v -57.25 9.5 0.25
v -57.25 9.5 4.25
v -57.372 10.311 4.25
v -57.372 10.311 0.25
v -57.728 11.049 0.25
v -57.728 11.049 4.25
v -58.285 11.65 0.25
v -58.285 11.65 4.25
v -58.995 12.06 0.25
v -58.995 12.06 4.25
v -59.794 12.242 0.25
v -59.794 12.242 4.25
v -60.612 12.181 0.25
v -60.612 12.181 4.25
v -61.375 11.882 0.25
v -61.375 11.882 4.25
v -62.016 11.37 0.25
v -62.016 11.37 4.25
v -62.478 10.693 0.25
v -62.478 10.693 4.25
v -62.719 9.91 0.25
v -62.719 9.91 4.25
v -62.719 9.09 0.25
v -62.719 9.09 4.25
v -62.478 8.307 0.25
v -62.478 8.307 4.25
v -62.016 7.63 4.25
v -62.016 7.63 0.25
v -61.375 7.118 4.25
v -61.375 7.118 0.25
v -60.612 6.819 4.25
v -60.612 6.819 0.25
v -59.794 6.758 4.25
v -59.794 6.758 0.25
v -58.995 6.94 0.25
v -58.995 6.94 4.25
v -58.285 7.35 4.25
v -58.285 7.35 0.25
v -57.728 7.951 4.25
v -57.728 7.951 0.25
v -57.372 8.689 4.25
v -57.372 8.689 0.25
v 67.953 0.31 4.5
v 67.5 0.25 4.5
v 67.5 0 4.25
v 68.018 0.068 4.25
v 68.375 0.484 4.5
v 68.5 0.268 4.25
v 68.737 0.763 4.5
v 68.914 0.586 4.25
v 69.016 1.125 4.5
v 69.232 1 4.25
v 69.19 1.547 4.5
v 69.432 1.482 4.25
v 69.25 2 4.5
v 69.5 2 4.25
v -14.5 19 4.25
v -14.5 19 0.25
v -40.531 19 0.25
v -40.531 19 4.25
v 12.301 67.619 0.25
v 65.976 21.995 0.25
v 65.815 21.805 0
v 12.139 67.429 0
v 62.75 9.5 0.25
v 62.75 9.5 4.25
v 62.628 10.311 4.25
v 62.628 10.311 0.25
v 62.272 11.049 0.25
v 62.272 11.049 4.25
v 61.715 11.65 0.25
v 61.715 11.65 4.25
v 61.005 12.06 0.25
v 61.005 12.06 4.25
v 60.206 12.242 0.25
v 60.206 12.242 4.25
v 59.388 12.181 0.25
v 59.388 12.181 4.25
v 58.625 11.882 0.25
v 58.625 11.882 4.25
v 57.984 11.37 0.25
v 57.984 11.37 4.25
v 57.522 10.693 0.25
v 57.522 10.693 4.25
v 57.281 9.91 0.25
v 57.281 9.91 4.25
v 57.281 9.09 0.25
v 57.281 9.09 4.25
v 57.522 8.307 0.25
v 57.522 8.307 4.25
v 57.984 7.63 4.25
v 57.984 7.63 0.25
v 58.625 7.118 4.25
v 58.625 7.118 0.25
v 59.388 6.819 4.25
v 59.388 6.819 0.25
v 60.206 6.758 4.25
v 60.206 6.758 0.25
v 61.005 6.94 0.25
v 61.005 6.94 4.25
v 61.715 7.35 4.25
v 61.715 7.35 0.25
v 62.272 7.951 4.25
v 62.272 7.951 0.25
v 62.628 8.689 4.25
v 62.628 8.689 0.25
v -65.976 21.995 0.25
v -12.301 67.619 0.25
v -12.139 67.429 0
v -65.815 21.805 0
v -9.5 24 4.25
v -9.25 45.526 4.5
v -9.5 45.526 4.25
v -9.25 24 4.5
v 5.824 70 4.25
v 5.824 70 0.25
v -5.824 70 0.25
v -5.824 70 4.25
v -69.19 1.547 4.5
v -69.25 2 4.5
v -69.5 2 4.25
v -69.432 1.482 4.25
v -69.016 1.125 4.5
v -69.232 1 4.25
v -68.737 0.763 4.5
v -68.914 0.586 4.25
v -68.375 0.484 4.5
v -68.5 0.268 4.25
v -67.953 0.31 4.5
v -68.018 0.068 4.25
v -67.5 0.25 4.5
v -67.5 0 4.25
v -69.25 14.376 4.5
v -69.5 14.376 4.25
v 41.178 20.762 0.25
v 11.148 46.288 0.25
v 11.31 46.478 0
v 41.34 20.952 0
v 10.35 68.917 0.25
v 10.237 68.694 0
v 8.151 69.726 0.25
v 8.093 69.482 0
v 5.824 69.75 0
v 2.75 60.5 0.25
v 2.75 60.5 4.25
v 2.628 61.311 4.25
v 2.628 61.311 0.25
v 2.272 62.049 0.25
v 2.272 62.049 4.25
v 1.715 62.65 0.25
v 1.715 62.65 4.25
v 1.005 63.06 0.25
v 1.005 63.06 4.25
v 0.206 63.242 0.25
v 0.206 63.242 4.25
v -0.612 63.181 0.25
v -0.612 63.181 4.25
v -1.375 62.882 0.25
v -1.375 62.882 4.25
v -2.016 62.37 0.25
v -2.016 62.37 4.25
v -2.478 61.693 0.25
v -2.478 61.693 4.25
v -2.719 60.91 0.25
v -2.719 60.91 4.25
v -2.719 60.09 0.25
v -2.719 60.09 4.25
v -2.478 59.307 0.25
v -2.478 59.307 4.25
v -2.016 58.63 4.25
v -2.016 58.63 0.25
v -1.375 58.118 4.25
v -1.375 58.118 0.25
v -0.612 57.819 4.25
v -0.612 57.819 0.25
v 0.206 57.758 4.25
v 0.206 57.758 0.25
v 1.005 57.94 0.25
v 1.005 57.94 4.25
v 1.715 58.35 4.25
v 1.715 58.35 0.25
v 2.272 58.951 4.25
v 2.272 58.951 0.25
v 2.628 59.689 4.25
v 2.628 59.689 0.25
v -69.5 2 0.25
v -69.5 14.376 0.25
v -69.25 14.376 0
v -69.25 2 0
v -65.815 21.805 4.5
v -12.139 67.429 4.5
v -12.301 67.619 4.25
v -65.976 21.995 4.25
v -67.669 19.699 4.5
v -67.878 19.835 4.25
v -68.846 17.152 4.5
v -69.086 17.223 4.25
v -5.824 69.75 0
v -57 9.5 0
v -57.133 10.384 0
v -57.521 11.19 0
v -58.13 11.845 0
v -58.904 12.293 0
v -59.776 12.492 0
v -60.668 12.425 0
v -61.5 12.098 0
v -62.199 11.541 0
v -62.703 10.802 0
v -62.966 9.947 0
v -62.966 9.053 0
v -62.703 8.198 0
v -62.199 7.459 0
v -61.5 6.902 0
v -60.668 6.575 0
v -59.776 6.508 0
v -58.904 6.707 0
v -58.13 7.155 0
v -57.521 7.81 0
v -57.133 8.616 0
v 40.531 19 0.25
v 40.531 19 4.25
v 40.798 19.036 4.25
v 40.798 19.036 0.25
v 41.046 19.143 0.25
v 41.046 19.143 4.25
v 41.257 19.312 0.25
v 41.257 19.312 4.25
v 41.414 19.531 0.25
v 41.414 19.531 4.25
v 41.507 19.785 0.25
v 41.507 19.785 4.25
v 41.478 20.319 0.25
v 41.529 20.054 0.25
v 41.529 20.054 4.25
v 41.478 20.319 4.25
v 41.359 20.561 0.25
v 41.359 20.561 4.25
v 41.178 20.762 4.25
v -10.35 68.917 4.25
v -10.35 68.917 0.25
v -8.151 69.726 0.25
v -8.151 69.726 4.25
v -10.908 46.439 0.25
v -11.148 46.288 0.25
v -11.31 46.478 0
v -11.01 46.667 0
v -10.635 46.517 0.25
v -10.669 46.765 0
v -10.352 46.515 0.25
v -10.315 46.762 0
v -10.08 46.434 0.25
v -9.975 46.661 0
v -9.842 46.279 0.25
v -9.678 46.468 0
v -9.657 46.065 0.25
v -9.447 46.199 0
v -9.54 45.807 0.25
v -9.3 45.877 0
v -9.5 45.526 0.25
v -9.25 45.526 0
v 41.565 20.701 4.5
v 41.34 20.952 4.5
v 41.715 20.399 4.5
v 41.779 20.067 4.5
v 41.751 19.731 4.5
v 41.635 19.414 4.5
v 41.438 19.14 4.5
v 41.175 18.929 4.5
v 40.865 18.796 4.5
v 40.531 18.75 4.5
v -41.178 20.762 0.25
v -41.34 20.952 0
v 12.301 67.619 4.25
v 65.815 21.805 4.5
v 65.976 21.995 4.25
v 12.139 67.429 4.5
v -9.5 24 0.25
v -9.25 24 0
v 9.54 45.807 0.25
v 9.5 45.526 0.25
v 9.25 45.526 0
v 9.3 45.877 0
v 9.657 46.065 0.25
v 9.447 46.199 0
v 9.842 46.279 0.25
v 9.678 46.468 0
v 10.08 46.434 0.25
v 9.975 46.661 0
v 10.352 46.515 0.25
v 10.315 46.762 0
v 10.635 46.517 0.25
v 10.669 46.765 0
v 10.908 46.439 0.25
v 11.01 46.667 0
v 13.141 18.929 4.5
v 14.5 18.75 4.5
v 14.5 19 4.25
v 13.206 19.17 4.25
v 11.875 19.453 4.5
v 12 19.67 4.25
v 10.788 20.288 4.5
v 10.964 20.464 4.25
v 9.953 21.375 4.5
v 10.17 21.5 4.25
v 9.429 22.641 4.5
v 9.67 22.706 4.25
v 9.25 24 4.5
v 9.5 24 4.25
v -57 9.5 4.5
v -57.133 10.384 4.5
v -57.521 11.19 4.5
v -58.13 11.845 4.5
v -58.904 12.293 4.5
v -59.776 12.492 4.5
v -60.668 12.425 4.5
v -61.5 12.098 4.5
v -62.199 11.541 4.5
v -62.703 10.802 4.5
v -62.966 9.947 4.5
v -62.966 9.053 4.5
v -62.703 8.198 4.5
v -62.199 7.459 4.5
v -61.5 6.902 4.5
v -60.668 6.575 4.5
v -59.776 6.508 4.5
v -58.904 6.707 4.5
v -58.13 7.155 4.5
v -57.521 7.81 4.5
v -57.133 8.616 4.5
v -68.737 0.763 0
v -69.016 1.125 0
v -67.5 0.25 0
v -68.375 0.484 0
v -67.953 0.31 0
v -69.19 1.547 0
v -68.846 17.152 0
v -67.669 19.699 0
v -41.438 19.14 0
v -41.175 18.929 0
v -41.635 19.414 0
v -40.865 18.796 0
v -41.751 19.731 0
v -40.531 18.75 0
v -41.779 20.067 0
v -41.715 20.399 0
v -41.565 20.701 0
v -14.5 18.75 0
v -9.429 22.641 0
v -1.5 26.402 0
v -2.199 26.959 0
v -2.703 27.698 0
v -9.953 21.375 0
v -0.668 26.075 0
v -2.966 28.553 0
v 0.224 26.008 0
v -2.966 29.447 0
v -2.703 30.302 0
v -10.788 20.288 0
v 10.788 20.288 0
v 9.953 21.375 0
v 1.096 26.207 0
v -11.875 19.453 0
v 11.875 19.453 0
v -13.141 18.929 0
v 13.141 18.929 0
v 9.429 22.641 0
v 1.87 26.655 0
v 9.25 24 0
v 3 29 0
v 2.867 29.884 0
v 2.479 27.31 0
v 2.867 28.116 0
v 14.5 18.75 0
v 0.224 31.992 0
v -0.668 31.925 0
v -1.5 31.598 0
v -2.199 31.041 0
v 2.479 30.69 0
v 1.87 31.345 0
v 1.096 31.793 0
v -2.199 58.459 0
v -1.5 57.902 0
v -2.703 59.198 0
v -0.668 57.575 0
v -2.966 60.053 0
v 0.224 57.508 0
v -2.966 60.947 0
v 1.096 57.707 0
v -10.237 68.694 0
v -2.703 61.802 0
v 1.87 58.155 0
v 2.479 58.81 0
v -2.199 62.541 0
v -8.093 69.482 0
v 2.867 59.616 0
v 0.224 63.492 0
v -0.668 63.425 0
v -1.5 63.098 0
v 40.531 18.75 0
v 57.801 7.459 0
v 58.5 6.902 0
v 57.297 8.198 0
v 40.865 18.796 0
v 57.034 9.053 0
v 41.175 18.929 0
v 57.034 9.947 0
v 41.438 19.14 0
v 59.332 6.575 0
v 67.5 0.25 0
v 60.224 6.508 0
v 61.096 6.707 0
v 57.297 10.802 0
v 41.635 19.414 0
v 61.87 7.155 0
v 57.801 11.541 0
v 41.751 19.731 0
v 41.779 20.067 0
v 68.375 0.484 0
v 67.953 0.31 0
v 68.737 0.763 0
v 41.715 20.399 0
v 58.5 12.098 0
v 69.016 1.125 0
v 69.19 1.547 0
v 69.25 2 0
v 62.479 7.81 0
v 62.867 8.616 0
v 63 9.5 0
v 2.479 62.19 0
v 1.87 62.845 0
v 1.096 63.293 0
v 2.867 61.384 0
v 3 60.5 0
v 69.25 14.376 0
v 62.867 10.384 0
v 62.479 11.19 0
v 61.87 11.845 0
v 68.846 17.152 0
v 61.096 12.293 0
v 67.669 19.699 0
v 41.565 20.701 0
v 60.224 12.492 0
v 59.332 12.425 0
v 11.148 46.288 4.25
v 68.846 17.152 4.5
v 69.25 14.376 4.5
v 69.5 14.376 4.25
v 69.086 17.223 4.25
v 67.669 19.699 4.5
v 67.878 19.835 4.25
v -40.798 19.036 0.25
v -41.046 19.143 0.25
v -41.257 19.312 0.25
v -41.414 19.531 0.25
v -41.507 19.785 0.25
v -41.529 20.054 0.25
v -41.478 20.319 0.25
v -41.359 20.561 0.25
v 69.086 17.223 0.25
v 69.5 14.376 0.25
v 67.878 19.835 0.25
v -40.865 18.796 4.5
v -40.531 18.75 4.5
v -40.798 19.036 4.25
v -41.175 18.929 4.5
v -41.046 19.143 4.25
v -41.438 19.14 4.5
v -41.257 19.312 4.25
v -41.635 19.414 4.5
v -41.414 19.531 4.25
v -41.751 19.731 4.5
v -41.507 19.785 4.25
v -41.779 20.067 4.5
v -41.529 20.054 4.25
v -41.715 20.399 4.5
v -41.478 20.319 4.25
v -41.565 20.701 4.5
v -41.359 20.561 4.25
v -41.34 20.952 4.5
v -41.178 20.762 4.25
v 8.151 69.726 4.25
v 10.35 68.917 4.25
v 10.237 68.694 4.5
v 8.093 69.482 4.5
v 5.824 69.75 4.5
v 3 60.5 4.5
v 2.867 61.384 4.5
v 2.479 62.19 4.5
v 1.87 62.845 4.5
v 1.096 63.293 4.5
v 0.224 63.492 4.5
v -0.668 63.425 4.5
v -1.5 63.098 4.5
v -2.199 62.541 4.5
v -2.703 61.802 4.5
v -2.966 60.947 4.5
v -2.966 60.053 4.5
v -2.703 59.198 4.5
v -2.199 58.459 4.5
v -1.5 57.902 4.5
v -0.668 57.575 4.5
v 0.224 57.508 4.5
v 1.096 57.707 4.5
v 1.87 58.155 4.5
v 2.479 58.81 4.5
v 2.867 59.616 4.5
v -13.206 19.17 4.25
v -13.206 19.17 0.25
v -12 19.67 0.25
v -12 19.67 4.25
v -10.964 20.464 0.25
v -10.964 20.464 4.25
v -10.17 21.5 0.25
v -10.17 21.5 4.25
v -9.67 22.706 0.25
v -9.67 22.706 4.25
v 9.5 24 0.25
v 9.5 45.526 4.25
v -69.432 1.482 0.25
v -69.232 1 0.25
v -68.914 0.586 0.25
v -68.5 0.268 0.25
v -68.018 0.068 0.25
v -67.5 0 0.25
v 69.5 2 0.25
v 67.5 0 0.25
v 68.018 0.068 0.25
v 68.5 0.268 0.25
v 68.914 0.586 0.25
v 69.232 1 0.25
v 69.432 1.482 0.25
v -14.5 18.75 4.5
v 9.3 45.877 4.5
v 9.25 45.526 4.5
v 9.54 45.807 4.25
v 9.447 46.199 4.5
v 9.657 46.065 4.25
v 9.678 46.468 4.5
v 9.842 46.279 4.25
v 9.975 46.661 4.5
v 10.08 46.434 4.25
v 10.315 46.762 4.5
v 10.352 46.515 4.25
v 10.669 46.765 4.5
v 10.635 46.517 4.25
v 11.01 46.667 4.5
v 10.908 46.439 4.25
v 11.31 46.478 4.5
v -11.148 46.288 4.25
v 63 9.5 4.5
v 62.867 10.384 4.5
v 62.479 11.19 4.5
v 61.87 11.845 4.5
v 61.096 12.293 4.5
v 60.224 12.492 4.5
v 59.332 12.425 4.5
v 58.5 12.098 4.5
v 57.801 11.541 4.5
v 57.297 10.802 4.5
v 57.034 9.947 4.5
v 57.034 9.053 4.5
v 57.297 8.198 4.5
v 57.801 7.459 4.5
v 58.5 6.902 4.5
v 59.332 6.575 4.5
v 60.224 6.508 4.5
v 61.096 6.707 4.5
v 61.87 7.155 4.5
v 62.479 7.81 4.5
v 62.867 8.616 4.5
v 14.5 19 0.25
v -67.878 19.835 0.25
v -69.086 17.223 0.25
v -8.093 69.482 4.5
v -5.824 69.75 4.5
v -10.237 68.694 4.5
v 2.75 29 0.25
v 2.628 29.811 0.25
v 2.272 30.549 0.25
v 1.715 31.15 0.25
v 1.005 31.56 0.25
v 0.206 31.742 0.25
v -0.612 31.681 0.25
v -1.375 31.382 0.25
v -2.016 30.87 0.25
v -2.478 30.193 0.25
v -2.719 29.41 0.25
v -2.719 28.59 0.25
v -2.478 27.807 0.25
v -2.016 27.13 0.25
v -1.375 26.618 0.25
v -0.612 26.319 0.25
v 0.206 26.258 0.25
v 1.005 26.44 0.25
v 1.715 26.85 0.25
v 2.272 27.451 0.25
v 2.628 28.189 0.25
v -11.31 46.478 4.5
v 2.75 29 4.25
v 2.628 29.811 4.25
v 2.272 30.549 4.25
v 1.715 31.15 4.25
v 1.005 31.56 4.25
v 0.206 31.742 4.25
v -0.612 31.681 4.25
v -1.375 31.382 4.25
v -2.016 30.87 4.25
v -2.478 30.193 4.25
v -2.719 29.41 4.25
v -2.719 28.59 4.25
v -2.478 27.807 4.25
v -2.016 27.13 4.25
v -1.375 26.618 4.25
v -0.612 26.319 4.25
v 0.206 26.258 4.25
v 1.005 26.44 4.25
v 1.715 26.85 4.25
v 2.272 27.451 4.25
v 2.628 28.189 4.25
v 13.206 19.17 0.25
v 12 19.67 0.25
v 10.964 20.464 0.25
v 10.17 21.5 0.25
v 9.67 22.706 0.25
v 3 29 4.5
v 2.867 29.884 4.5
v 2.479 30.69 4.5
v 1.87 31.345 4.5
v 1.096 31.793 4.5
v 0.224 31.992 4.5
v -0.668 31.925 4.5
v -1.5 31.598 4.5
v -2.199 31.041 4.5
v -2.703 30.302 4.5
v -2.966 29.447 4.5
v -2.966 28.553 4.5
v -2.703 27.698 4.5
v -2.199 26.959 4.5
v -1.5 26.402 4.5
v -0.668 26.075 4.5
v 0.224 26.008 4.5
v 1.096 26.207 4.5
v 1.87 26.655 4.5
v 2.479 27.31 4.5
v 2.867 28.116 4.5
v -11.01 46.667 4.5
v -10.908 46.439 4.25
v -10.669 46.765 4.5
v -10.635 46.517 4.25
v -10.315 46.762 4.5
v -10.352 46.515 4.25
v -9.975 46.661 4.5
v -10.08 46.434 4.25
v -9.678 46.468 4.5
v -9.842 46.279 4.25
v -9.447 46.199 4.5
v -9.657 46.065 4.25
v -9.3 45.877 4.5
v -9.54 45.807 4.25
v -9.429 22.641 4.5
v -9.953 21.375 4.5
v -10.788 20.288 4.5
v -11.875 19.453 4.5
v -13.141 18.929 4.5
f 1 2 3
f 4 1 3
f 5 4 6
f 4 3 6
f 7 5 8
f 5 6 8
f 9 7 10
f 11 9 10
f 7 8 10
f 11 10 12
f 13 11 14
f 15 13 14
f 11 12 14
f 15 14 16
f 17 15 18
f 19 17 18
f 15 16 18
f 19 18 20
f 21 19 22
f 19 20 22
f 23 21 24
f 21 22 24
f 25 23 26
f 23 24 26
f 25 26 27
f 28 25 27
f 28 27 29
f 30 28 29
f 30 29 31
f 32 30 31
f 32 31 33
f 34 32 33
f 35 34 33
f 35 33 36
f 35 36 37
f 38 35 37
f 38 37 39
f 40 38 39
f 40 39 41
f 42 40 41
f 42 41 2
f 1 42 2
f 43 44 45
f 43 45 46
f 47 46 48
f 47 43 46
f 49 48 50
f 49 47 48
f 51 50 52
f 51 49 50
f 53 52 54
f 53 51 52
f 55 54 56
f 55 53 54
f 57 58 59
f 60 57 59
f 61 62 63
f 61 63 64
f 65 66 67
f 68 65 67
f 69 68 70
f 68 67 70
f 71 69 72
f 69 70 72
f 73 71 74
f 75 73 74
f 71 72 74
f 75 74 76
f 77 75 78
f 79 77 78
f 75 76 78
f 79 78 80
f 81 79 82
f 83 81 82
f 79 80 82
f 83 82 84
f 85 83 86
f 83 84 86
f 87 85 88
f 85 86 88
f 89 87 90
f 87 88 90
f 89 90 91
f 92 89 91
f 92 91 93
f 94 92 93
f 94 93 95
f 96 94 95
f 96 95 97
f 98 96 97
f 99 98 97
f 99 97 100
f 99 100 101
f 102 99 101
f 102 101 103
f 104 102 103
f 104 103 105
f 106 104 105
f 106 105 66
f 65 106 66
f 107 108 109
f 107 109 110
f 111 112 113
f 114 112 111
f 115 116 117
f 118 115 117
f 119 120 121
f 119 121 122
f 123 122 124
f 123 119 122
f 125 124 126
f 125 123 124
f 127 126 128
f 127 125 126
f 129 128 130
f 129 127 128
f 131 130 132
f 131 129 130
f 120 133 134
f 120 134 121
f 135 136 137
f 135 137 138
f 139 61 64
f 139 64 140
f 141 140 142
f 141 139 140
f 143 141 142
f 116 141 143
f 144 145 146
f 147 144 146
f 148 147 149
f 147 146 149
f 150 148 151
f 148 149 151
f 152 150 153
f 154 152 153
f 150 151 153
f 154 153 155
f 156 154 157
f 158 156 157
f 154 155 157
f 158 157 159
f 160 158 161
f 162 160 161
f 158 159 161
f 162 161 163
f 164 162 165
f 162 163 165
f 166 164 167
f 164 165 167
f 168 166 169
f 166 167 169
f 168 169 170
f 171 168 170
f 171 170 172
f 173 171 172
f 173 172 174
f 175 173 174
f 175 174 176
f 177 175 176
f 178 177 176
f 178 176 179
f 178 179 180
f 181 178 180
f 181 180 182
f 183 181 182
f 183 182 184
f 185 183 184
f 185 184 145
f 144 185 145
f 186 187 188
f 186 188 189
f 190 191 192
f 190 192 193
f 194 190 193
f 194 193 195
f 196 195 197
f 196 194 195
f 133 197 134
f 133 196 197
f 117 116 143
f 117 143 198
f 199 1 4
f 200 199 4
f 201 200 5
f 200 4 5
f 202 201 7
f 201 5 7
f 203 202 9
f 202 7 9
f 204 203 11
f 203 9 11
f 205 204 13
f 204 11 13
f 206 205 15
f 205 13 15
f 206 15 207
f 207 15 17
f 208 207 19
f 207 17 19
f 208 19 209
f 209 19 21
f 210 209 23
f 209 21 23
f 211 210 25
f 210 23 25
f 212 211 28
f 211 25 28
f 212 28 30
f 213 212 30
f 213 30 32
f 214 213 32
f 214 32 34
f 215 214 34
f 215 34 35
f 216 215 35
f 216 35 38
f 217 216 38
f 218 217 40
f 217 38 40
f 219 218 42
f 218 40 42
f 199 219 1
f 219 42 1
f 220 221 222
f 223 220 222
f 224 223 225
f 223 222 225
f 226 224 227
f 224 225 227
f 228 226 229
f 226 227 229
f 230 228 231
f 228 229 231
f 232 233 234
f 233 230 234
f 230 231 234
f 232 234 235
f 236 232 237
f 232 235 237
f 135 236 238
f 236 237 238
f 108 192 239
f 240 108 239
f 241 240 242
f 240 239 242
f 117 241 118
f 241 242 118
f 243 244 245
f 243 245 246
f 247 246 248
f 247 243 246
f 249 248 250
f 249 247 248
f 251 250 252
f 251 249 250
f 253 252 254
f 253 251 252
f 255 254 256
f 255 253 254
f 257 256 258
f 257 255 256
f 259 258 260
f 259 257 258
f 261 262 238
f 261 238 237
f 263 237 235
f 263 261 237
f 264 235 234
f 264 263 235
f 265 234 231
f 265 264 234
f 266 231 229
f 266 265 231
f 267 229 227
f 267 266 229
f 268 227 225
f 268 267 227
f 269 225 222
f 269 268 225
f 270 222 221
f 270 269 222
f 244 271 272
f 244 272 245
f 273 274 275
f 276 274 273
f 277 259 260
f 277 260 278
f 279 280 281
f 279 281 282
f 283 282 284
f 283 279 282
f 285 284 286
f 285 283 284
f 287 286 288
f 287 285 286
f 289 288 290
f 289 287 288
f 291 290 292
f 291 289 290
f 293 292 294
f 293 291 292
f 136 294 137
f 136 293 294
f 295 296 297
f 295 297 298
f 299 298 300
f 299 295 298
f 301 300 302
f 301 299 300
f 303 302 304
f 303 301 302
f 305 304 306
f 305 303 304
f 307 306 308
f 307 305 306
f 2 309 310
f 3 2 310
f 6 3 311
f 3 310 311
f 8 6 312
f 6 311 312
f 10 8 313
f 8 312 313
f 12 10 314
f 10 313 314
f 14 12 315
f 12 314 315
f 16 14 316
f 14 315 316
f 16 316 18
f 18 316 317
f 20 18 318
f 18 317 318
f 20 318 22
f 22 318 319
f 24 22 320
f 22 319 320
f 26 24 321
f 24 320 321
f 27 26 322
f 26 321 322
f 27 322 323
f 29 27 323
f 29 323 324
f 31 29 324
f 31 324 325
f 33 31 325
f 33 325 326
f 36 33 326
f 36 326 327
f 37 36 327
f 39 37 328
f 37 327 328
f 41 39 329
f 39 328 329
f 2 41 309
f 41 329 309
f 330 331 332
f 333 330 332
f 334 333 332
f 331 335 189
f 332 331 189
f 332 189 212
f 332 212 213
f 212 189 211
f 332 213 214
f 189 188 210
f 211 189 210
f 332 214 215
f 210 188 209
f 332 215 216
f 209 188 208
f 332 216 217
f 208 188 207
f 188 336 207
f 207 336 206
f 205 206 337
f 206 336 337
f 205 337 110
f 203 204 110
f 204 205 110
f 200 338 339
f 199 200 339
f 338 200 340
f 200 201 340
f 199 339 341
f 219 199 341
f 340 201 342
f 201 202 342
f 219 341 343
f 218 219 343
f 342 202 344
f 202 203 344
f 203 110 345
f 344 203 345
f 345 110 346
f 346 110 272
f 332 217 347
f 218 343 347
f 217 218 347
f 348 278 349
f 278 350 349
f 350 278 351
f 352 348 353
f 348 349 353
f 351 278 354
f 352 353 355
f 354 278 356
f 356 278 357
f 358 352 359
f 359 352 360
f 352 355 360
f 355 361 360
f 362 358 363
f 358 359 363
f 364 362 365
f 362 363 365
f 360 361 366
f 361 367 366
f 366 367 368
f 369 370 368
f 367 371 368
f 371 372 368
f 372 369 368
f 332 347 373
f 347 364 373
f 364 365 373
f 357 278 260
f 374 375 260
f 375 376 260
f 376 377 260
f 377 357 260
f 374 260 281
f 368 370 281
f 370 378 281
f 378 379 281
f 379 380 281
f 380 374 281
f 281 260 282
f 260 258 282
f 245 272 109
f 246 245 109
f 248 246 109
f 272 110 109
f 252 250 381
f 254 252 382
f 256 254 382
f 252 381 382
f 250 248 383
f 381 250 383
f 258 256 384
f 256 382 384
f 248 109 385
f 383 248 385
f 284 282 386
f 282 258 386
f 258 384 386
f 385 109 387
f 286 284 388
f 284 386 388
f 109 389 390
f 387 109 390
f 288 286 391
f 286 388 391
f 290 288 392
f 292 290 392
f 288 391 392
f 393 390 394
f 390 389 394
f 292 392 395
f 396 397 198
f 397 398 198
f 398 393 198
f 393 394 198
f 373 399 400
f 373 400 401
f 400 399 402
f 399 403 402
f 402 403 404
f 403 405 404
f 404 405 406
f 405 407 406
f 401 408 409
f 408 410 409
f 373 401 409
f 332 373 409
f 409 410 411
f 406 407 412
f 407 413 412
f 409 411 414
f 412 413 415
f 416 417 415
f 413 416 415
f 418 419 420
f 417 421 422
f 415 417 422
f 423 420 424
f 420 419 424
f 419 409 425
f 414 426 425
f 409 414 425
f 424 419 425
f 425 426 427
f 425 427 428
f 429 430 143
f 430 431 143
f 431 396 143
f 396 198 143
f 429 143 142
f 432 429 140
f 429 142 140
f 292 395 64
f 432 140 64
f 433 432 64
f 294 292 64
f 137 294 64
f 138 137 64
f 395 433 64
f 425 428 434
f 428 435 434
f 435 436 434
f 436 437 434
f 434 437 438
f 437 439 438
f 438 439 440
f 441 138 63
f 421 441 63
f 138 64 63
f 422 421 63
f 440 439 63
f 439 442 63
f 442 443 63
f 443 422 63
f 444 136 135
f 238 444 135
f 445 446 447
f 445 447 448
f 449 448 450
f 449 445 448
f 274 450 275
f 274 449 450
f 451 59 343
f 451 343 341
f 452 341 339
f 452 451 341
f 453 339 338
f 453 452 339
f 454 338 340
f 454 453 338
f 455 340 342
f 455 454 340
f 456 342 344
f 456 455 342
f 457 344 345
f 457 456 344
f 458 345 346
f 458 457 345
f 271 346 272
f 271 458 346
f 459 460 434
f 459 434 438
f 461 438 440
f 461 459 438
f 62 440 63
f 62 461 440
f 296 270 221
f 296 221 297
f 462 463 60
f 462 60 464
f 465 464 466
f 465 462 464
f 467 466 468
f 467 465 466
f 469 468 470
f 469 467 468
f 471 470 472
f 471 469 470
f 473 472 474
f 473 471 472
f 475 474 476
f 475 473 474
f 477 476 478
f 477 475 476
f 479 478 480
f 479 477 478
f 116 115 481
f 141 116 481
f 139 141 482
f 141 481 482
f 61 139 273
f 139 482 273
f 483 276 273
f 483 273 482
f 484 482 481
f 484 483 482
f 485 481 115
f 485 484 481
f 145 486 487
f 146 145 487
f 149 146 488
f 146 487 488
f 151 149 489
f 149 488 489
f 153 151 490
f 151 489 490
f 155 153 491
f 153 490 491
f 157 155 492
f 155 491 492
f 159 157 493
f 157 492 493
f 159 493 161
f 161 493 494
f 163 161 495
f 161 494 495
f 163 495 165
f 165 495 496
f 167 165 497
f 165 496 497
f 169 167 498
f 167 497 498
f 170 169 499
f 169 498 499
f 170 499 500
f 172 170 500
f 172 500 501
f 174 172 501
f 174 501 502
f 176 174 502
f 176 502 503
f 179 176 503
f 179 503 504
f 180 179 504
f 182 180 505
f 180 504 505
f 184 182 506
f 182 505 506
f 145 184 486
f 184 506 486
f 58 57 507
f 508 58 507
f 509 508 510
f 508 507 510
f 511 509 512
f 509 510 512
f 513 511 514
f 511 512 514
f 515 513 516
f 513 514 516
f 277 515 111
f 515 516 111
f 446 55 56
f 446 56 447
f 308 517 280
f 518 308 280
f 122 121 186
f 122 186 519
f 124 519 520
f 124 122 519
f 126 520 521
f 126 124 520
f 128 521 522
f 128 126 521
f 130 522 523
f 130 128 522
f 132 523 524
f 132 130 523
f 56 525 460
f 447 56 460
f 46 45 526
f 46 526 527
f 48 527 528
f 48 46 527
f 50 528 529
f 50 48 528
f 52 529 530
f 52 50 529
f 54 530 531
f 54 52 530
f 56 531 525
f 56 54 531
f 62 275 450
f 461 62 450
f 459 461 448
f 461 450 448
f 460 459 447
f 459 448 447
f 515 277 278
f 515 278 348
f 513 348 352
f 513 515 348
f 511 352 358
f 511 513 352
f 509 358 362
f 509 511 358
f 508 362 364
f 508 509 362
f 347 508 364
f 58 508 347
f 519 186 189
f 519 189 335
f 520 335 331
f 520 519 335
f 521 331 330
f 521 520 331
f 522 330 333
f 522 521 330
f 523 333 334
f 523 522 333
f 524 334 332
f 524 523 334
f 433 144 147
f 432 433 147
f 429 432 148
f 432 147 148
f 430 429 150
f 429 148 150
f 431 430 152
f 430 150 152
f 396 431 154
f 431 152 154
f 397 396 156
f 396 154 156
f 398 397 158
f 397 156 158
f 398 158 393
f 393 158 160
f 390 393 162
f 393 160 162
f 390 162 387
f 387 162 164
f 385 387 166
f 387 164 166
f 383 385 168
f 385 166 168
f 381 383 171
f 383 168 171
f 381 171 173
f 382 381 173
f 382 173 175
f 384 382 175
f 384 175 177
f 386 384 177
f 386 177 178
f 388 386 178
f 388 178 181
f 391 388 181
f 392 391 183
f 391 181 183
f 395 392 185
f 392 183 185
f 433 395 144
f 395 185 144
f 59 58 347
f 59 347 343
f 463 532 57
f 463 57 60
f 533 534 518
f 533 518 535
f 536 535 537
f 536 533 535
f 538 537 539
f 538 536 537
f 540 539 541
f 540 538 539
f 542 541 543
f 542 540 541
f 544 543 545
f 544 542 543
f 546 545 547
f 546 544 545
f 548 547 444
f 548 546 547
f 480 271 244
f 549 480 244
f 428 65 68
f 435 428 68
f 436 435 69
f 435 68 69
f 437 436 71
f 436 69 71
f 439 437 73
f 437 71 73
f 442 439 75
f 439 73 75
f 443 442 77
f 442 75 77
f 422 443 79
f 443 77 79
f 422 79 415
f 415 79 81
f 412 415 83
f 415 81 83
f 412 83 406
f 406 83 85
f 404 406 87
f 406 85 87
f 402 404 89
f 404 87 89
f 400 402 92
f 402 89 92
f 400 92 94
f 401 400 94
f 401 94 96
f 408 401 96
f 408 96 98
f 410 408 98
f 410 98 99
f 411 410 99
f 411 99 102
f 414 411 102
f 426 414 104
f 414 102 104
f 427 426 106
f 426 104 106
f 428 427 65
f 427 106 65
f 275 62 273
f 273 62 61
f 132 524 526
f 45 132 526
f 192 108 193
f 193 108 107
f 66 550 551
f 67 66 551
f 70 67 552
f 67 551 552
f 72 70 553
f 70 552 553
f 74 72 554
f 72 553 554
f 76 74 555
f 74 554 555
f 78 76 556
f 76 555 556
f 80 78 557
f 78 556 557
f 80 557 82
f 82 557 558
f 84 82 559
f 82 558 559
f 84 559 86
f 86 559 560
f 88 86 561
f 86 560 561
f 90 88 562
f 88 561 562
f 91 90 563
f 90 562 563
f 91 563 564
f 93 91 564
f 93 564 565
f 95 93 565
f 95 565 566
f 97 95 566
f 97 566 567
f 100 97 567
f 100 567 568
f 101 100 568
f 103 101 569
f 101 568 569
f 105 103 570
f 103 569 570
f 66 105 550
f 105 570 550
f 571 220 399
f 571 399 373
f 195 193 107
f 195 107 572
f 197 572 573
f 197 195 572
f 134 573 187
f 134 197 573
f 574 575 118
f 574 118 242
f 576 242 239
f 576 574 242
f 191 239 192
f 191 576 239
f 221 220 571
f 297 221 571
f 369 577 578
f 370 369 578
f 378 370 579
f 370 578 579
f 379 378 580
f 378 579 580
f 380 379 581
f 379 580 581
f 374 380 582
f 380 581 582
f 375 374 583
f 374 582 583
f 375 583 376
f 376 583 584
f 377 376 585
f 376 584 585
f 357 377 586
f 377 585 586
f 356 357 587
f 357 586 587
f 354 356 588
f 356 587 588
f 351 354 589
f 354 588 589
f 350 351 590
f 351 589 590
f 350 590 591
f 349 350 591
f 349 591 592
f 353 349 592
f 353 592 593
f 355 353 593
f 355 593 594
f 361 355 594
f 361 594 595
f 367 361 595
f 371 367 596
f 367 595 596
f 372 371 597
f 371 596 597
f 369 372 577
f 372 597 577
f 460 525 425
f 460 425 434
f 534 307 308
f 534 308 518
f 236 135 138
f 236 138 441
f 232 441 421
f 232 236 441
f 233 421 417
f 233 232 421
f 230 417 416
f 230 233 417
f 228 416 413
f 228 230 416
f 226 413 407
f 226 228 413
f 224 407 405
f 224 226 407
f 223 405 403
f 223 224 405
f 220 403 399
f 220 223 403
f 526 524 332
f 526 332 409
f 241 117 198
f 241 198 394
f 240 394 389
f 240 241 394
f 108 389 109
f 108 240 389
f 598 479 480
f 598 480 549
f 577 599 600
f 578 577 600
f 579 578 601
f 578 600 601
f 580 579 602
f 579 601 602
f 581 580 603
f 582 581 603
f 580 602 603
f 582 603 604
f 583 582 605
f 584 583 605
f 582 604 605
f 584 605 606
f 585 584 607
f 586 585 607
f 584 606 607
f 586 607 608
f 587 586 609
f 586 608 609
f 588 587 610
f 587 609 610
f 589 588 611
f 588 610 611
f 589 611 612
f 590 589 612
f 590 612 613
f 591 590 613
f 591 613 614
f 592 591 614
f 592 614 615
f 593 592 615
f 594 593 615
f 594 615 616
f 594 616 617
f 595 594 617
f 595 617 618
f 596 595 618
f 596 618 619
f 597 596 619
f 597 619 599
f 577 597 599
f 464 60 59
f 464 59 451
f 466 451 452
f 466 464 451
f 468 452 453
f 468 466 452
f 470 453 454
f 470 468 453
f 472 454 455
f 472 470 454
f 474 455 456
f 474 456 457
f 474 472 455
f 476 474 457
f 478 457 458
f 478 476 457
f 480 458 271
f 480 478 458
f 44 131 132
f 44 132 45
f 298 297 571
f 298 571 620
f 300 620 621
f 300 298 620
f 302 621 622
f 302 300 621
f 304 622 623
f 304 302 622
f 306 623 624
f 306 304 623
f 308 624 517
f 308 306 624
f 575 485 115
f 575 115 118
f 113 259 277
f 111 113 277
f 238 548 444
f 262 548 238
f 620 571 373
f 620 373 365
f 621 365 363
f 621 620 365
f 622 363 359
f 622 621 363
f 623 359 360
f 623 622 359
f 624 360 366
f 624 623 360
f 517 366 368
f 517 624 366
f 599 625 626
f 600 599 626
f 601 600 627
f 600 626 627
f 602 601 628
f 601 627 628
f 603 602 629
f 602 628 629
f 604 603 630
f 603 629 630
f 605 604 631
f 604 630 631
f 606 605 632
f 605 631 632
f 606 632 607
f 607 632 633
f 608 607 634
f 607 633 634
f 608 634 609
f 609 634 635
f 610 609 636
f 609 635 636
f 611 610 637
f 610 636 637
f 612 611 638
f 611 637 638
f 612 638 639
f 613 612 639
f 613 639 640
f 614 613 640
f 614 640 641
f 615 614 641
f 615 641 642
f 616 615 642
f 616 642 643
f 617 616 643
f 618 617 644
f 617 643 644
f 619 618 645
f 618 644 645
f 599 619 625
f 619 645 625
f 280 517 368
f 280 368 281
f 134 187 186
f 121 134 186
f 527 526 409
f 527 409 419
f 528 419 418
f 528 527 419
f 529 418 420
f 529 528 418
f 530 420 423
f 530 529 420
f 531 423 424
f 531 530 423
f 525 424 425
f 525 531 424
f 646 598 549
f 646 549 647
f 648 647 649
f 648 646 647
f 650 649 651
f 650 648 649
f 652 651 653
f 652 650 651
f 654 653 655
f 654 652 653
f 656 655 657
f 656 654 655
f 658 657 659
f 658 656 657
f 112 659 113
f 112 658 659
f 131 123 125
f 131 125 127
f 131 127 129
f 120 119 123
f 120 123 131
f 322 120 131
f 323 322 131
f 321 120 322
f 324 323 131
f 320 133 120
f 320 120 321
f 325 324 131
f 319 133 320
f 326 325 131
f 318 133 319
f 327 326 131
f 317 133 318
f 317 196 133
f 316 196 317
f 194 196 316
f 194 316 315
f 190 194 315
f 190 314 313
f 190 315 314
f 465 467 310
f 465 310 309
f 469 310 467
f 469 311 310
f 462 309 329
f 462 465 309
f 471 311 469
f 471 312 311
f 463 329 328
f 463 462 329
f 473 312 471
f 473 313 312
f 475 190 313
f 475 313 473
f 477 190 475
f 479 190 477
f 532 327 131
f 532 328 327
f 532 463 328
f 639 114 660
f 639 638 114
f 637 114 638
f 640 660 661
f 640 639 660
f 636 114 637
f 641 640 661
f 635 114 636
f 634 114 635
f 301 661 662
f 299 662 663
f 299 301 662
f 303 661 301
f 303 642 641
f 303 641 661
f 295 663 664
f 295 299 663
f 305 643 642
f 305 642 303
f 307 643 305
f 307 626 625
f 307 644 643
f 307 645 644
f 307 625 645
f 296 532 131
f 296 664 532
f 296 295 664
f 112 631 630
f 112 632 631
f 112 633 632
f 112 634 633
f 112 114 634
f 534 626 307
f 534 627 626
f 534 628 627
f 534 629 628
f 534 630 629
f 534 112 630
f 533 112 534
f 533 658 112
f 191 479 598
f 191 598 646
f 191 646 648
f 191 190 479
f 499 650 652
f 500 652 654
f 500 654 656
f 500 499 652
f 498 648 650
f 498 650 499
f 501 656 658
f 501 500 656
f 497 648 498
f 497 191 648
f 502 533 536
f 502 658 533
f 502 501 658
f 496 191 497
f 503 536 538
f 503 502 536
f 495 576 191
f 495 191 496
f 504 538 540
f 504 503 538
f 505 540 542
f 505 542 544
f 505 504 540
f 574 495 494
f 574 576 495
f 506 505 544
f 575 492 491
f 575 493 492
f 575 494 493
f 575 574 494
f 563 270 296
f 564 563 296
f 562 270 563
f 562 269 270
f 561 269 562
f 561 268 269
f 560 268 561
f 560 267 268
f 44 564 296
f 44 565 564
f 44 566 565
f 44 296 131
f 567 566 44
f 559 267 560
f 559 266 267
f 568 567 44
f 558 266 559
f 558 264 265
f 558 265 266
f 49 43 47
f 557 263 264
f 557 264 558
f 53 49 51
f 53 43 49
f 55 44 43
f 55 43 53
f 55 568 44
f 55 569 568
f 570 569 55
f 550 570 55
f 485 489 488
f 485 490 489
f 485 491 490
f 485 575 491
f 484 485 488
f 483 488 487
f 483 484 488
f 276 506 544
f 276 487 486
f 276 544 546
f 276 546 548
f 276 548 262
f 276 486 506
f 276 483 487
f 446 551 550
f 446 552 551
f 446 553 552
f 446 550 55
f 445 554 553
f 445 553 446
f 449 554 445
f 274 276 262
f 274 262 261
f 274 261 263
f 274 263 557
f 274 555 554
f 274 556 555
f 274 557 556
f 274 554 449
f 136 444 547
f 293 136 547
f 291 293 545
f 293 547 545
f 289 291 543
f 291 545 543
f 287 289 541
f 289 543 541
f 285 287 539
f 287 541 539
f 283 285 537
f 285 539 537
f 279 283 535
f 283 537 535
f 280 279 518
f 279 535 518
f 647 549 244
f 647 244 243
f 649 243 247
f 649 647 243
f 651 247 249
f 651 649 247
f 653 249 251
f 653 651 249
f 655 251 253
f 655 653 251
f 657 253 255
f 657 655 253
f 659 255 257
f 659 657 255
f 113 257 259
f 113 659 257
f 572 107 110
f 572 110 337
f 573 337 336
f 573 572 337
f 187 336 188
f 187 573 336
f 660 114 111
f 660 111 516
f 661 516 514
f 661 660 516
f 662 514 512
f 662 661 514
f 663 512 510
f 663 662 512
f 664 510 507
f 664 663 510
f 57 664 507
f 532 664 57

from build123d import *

# Parameters (mm, degrees)
F1_DEPTH = 4.5
F2_R     = 2.75
F3_DEPTH = 4.501
F4_R     = 5
F5_R     = 1
F6_R     = 10
F7_R     = 2
F8_SIZE  = 0.25


with BuildPart() as f1:
    # F0 (on Top) → F1 (new body)
    with BuildSketch(Plane.XY):
        Polygon((-9.5, 70), (-69.5, 19), (-69.5, 0), (69.5, 0), (69.5, 19), (9.5, 70), align=None)
        Polygon((-43.2511905032, 19), (-9.5, 47.6885119277), (-9.5, 19), align=None, mode=Mode.SUBTRACT)
        Polygon((9.5, 19), (9.5, 47.6885119277), (43.2511905032, 19), align=None, mode=Mode.SUBTRACT)
    extrude(amount=F1_DEPTH)

    # F2 (on face) → F3 (cut, through all)
    with BuildSketch(Plane.XY.offset(4.5)):
        with Locations((0, 60.5)):
            Circle(F2_R)
        with Locations((0, 29)):
            Circle(F2_R)
        with Locations((60, 9.5)):
            Circle(F2_R)
        with Locations((-60, 9.5)):
            Circle(F2_R)
    extrude(amount=-F3_DEPTH, mode=Mode.SUBTRACT)

    # F4
    f4_edges = [f1.edges().sort_by_distance(p)[0] for p in [
        (-9.5, 19, 2.25),
        (9.5, 19, 2.25),
    ]]
    fillet(f4_edges, radius=F4_R)

    # F5
    f5_edges = [f1.edges().sort_by_distance(p)[0] for p in [
        (43.251191, 19, 2.25),
        (9.5, 47.688512, 2.25),
        (-9.5, 47.688512, 2.25),
        (-43.251191, 19, 2.25),
    ]]
    fillet(f5_edges, radius=F5_R)

    # F6
    f6_edges = [f1.edges().sort_by_distance(p)[0] for p in [
        (-9.5, 70, 2.25),
        (9.5, 70, 2.25),
        (-69.5, 19, 2.25),
        (69.5, 19, 2.25),
    ]]
    fillet(f6_edges, radius=F6_R)

    # F7
    f7_edges = [f1.edges().sort_by_distance(p)[0] for p in [
        (-69.5, 0, 2.25),
        (69.5, 0, 2.25),
    ]]
    fillet(f7_edges, radius=F7_R)

    # F8
    f8_edges = [f1.edges().sort_by_distance(p)[0] for p in [
        (-2.75, 60.5, 4.5),
        (-2.75, 29, 4.5),
        (57.25, 9.5, 4.5),
        (-62.75, 9.5, 4.5),
        (-2.75, 60.5, 0),
        (-62.75, 9.5, 0),
        (-2.75, 29, 0),
        (57.25, 9.5, 0),
        (0, 0, 4.5),
        (0, 0, 0),
        (-27.515336, 19, 0),
        (-69.5, 8.187798, 4.5),
        (-68.914214, 0.585786, 4.5),
        (-68.576476, 18.572925, 4.5),
        (-39.138599, 44.807191, 4.5),
        (68.914214, 0.585786, 4.5),
        (-9.274307, 69.385998, 4.5),
        (69.5, 8.187798, 4.5),
        (0, 70, 4.5),
        (68.576476, 18.572925, 4.5),
        (9.274307, 69.385998, 4.5),
        (39.138599, 44.807191, 4.5),
        (-27.515336, 19, 4.5),
        (-41.469272, 19.654992, 4.5),
        (-10.964466, 20.464466, 4.5),
        (-26.162985, 33.524975, 4.5),
        (-9.5, 34.763036, 4.5),
        (-10.080267, 46.433719, 4.5),
        (9.5, 34.763036, 4.5),
        (10.080267, 46.433719, 4.5),
        (10.964466, 20.464466, 4.5),
        (26.162985, 33.524975, 4.5),
        (27.515336, 19, 4.5),
        (41.469272, 19.654992, 4.5),
        (-69.5, 8.187798, 0),
        (-68.914214, 0.585786, 0),
        (-68.576476, 18.572925, 0),
        (-39.138599, 44.807191, 0),
        (68.914214, 0.585786, 0),
        (-9.274307, 69.385998, 0),
        (69.5, 8.187798, 0),
        (0, 70, 0),
        (68.576476, 18.572925, 0),
        (9.274307, 69.385998, 0),
        (39.138599, 44.807191, 0),
        (-41.469272, 19.654992, 0),
        (-10.964466, 20.464466, 0),
        (-26.162985, 33.524975, 0),
        (-9.5, 34.763036, 0),
        (-10.080267, 46.433719, 0),
        (9.5, 34.763036, 0),
        (10.080267, 46.433719, 0),
        (10.964466, 20.464466, 0),
        (26.162985, 33.524975, 0),
        (27.515336, 19, 0),
        (41.469272, 19.654992, 0),
    ]]
    chamfer(f8_edges, length=F8_SIZE)


solid = f1.part
